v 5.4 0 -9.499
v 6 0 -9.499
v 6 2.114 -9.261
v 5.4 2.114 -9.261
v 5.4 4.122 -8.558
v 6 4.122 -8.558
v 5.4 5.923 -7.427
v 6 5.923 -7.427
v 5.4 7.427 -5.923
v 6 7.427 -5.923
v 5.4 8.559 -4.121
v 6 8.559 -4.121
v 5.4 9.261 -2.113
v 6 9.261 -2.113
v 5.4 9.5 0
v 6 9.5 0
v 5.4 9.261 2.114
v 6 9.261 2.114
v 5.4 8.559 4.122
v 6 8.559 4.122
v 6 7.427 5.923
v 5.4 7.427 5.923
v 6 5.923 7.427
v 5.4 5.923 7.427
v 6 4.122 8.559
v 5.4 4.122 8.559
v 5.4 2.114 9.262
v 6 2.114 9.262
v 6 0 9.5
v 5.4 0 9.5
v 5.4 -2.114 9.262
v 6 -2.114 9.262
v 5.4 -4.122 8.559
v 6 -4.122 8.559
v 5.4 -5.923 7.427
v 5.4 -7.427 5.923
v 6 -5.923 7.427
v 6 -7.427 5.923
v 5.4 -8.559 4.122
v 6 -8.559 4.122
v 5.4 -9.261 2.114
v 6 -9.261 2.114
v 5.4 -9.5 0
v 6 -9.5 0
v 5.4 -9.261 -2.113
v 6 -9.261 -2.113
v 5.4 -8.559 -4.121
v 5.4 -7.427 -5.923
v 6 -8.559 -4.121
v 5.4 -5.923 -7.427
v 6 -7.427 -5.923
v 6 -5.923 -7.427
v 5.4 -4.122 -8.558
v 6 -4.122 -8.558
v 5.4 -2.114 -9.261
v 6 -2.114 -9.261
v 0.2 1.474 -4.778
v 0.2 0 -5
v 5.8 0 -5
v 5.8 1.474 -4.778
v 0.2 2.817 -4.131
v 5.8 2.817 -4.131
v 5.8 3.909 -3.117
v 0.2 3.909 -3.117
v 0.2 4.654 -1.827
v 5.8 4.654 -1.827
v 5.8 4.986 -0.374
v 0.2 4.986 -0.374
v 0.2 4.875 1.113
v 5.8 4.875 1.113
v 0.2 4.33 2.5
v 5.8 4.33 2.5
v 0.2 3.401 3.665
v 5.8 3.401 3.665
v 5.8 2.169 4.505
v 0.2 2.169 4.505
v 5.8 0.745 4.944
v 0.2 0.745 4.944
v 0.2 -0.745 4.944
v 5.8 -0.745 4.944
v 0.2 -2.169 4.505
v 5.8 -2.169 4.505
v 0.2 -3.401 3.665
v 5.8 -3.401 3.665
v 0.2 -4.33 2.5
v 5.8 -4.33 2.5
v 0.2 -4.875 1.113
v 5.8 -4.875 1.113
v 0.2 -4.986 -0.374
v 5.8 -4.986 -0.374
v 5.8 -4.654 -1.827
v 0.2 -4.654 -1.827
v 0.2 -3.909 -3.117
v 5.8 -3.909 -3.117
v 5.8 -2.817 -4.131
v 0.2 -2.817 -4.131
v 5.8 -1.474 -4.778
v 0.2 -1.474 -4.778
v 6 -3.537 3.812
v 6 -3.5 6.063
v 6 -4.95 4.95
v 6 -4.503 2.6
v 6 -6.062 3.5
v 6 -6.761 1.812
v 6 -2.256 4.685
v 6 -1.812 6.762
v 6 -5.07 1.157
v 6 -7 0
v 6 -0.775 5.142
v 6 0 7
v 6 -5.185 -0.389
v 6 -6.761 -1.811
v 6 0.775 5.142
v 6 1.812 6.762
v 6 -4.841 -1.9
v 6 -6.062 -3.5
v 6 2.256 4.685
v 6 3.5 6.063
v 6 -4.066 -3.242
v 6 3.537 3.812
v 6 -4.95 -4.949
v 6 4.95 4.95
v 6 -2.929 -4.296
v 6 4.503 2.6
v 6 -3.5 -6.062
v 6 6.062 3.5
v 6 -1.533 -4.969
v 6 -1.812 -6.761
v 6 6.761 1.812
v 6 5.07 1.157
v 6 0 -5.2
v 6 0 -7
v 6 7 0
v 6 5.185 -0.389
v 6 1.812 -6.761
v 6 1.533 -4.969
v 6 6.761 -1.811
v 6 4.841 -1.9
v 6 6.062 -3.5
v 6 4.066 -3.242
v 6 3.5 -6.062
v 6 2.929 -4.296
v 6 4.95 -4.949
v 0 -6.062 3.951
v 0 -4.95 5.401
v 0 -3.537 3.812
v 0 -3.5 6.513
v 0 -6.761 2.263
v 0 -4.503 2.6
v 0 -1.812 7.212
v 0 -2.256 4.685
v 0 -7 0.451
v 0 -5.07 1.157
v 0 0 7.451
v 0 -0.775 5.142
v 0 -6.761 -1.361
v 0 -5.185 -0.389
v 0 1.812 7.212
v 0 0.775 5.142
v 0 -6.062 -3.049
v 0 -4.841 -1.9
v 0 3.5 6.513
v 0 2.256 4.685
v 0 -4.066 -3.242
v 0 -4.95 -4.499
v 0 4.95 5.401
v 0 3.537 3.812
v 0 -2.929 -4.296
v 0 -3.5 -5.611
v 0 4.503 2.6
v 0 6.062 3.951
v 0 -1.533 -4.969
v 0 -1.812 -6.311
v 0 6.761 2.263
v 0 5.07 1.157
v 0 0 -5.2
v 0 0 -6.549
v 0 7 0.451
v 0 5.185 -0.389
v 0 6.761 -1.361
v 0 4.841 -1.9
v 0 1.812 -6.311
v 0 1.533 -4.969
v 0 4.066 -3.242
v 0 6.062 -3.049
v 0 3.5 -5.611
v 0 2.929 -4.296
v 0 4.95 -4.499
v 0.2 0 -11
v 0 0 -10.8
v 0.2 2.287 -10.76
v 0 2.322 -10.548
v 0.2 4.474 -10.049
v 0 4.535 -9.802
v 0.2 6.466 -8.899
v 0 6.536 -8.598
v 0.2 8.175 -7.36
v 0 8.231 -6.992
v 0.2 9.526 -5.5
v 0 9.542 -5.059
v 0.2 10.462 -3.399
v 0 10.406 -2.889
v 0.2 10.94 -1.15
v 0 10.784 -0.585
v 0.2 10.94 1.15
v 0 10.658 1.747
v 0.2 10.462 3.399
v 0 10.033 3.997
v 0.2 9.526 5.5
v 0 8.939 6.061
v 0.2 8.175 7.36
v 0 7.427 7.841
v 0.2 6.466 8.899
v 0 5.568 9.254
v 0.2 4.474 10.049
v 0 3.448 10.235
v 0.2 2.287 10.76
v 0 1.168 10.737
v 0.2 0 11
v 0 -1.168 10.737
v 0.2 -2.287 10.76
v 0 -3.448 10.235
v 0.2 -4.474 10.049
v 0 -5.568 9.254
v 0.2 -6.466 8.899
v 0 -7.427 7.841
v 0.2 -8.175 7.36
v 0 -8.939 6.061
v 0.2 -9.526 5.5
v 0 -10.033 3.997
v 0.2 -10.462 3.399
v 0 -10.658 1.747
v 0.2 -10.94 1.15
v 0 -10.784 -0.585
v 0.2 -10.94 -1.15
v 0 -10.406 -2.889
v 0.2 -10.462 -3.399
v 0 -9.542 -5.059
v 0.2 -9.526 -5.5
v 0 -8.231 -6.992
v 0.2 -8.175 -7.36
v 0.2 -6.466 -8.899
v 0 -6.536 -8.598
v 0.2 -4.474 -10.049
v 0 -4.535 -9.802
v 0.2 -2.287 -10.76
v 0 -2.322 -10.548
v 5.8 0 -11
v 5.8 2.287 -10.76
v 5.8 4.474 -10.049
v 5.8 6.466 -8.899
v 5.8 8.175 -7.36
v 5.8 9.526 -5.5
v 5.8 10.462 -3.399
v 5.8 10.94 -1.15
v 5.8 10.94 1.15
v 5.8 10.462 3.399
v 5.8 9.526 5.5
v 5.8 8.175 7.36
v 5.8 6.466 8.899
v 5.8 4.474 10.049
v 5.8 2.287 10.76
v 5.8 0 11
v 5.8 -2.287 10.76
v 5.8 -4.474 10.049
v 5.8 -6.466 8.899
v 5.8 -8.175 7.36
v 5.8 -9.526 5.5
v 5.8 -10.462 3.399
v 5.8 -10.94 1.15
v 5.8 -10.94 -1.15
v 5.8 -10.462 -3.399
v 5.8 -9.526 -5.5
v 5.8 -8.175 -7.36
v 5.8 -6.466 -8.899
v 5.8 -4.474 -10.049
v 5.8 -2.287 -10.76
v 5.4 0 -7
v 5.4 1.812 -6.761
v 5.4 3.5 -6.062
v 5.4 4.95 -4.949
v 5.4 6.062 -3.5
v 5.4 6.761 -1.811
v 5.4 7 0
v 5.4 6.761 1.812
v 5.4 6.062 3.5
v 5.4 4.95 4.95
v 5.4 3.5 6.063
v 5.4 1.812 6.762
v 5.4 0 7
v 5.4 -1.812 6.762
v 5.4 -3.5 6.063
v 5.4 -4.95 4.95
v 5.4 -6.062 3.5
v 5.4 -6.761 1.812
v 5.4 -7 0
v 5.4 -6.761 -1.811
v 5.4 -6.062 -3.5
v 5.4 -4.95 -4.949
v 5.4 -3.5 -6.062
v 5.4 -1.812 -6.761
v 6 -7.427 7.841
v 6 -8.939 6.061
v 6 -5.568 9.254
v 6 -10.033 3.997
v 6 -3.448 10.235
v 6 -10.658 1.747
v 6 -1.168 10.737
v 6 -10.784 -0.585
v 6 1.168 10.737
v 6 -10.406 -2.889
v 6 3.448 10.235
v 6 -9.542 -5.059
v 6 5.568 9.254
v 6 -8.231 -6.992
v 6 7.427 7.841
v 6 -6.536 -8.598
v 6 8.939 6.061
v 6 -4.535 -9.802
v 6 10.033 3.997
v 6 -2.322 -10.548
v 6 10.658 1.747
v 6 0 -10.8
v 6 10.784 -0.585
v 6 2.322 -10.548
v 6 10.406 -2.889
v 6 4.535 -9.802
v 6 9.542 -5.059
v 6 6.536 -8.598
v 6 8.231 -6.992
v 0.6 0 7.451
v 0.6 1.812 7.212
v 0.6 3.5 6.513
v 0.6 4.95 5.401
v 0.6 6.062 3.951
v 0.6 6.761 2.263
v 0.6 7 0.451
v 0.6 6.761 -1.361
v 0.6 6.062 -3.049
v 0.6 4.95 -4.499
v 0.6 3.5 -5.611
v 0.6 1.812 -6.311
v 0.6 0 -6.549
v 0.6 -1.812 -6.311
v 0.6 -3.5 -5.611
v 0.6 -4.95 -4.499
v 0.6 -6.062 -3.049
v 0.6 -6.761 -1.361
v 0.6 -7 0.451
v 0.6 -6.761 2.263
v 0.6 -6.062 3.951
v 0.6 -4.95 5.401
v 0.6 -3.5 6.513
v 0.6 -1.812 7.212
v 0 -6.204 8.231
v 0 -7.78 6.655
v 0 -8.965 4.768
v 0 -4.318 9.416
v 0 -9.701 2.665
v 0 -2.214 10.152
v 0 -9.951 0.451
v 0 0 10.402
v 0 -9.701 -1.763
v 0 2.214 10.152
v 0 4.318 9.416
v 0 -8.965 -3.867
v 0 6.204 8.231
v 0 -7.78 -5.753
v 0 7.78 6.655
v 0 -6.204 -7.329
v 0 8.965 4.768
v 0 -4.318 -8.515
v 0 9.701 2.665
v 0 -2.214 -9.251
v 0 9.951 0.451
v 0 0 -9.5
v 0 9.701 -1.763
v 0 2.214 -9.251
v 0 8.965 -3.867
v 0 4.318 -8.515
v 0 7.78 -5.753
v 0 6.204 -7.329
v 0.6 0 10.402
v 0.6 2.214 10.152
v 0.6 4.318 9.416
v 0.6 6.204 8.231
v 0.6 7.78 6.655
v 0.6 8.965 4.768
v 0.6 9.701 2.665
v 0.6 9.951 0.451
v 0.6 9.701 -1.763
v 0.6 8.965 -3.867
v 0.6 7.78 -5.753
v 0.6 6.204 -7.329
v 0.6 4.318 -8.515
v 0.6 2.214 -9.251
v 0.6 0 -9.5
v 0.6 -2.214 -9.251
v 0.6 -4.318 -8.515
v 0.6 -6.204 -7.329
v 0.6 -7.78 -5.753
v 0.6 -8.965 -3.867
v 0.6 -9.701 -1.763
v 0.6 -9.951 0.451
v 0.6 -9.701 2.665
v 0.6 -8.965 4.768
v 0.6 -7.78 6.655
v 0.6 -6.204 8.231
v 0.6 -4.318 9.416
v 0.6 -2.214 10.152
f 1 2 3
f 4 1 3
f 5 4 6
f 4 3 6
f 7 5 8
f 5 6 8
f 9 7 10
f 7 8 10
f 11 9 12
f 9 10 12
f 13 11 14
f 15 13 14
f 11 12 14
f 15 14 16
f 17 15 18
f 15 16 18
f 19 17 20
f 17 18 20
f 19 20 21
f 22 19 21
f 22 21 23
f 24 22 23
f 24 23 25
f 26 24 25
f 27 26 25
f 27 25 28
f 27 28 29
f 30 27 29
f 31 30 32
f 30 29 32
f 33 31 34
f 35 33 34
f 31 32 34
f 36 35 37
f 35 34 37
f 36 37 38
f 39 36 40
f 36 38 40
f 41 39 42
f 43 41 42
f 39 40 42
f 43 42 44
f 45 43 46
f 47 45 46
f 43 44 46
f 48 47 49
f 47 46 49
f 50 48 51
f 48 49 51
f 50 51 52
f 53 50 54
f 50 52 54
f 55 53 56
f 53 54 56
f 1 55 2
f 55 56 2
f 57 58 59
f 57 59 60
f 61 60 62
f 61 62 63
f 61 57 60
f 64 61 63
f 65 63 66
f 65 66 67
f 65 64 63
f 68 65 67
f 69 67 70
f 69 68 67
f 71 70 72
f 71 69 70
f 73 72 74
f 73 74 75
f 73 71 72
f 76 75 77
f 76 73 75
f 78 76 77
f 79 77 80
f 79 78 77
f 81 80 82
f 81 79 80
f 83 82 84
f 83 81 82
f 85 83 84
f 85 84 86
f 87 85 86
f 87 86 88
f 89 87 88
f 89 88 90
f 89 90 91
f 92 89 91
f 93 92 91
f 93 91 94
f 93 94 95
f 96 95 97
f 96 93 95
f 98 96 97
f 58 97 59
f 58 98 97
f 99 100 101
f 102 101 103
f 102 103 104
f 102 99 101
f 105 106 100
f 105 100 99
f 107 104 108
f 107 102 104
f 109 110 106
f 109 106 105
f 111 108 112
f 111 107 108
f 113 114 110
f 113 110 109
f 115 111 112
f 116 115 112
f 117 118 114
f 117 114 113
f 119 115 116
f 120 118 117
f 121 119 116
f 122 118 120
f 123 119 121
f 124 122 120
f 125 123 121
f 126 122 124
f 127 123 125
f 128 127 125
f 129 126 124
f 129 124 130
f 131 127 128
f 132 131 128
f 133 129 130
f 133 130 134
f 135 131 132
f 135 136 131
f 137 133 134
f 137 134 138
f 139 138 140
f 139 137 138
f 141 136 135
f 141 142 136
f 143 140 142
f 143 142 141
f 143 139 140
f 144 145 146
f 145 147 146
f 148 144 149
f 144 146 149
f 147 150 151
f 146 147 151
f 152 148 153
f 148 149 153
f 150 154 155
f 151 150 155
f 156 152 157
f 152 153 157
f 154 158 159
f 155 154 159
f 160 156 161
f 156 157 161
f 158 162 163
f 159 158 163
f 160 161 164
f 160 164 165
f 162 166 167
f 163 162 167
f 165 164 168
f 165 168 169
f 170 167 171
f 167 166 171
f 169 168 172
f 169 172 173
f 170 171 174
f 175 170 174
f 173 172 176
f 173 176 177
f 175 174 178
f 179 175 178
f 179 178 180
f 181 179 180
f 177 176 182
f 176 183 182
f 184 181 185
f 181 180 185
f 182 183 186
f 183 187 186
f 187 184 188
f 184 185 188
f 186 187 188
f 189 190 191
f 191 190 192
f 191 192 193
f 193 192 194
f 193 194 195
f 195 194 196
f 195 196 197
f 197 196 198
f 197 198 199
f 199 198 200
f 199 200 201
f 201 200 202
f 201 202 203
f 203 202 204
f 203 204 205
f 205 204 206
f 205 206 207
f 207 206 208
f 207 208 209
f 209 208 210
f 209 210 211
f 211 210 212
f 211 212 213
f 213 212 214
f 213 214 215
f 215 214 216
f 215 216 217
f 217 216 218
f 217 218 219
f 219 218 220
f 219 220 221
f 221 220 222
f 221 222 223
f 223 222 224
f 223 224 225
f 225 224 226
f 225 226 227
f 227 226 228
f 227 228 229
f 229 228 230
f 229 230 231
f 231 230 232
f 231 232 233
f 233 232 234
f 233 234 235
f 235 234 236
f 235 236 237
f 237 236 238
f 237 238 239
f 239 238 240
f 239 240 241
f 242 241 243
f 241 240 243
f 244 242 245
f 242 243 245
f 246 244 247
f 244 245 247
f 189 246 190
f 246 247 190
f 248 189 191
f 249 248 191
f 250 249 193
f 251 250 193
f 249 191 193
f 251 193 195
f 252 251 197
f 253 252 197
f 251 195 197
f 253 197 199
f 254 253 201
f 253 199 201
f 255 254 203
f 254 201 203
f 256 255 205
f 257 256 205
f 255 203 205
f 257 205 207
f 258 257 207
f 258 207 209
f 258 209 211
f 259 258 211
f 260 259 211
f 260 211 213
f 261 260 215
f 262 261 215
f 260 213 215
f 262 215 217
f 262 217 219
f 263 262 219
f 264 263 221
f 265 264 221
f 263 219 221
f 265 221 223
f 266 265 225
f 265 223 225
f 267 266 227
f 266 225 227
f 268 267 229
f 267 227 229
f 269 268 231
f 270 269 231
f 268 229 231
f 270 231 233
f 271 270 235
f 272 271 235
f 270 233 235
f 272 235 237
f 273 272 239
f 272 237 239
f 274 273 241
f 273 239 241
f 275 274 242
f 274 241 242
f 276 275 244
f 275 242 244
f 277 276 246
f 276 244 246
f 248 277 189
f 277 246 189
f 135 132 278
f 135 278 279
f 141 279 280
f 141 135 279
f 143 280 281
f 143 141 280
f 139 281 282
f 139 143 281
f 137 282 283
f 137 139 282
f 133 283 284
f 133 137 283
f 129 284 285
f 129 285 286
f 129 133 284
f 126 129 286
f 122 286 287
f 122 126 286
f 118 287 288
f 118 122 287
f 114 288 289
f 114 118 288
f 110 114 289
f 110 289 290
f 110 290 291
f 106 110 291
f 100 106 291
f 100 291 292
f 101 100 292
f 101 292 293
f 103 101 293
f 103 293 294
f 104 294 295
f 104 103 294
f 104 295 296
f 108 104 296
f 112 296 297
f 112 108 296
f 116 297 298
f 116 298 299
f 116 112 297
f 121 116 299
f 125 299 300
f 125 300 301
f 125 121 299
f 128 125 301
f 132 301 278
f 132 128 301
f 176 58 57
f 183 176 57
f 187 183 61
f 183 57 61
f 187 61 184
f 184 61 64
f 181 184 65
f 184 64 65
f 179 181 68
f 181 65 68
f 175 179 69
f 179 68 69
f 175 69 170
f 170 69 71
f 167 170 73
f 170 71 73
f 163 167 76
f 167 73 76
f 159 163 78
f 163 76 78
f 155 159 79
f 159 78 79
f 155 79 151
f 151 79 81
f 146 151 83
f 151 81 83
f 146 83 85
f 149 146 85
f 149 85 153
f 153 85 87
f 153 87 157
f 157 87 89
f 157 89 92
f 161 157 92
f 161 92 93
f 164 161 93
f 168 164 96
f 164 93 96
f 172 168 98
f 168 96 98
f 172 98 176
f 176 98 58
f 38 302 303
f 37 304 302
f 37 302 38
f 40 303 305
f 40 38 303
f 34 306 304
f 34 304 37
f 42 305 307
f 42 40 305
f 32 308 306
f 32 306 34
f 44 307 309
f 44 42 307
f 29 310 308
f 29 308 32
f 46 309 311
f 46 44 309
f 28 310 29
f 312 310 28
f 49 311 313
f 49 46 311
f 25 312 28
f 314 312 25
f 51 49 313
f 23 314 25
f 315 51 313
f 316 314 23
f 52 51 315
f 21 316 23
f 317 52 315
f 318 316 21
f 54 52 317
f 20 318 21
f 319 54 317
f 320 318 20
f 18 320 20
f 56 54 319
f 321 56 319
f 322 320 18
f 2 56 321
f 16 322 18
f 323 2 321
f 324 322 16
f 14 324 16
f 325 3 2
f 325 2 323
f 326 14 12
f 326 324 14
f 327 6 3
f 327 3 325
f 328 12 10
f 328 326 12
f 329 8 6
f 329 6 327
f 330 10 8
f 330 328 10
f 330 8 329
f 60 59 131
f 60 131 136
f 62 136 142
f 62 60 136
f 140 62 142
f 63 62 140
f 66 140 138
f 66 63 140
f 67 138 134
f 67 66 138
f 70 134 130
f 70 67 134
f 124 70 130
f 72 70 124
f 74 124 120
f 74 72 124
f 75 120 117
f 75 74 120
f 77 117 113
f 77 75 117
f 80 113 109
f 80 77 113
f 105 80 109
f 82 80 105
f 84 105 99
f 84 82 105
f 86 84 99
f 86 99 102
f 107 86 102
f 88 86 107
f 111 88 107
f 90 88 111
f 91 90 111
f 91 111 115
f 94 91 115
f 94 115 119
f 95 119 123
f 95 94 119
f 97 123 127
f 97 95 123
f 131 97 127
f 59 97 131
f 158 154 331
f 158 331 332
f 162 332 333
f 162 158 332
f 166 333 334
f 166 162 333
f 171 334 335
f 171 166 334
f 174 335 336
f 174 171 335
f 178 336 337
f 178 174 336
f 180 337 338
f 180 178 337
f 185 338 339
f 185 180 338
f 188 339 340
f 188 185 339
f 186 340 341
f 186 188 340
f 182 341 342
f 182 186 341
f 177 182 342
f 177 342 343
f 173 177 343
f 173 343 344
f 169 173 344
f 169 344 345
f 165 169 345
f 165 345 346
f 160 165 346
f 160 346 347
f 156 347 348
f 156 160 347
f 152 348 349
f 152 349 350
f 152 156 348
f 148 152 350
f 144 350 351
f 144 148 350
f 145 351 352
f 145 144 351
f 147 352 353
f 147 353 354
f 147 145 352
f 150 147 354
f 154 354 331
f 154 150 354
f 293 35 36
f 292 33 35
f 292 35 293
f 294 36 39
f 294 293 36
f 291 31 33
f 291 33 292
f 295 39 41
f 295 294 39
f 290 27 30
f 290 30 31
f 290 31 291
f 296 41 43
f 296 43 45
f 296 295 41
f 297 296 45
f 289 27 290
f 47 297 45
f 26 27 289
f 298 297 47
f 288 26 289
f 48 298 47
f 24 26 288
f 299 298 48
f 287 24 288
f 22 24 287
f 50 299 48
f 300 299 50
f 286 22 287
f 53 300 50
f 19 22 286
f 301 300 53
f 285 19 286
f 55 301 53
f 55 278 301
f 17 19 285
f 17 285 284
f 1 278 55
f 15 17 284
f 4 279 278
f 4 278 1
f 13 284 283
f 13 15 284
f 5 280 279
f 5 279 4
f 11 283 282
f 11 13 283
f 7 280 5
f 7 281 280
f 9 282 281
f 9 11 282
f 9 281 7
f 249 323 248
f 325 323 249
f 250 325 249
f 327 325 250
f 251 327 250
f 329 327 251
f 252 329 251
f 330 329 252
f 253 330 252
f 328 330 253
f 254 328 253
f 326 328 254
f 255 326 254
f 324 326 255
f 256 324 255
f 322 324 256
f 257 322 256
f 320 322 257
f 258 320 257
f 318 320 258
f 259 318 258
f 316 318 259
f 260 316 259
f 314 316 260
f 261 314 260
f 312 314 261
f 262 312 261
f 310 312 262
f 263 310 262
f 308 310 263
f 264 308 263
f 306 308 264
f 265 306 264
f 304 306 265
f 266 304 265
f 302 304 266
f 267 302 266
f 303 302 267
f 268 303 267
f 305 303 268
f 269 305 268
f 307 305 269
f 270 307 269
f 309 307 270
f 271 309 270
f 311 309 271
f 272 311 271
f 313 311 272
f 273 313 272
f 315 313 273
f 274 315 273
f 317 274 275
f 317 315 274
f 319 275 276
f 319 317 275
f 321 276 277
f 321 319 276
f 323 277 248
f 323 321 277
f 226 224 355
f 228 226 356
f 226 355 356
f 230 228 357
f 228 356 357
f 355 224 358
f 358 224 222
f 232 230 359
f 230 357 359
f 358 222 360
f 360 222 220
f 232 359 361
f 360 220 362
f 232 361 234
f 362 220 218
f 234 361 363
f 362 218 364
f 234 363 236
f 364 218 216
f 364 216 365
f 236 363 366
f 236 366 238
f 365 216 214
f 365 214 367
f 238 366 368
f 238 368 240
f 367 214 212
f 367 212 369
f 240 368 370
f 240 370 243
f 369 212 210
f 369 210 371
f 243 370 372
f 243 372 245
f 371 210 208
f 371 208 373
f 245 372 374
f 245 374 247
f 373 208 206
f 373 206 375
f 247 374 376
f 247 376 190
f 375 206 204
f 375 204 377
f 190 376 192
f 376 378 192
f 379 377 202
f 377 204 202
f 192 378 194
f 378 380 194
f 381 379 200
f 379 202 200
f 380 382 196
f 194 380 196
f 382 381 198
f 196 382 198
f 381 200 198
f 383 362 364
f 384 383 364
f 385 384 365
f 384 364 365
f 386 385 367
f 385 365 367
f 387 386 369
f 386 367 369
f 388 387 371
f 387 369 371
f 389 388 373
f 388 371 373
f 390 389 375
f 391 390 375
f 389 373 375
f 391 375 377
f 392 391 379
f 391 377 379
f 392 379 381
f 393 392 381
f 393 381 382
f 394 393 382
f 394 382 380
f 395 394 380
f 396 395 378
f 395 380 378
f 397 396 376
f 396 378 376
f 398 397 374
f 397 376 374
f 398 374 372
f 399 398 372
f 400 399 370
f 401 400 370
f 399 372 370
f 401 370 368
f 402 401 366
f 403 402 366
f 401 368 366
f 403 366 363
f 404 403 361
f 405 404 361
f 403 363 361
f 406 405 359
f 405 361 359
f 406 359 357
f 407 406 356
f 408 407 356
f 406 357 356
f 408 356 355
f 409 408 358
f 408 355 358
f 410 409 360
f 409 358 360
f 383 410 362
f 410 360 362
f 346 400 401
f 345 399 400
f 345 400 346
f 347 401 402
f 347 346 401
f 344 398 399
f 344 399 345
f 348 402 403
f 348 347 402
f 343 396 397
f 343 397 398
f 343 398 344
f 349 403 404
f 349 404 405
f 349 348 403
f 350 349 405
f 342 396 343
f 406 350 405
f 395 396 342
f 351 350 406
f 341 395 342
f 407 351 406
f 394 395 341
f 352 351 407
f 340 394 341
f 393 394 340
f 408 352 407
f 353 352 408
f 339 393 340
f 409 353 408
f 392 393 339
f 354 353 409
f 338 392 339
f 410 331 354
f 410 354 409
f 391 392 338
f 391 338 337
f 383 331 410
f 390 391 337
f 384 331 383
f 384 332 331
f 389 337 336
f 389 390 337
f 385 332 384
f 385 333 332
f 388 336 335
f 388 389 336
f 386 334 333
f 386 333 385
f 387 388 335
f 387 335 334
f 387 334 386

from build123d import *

# Parameters (mm, degrees)
SKETCH_1_R          = 11
SKETCH_1_R_2        = 5
EXTRUDE_1_DEPTH     = 6
SKETCH_2_R          = 9.499624375
SKETCH_2_R_2        = 7
CUT_EXTRUDE_1_DEPTH = 0.6
SKETCH_3_R          = 9.950876812
SKETCH_3_R_2        = 7
CUT_EXTRUDE_2_DEPTH = 0.6
CHAMFER_1_SIZE      = 0.2


with BuildPart() as part:
    # 草图1 → 凸台-拉伸1 (new body)
    with BuildSketch(Plane(origin=(0, 0, 0), x_dir=(0, 0, -1), z_dir=(1, 0, 0))):
        Circle(SKETCH_1_R)
        Circle(SKETCH_1_R_2, mode=Mode.SUBTRACT)
    extrude(amount=EXTRUDE_1_DEPTH)

    # 草图2 → 切除-拉伸1 (cut)
    with BuildSketch(Plane(origin=(6, 0, 0), x_dir=(0, 0, -1), z_dir=(1, 0, 0))):
        with Locations((-0.000375625, 0)):
            Circle(SKETCH_2_R)
        with Locations((-0.000375625, 0)):
            Circle(SKETCH_2_R_2, mode=Mode.SUBTRACT)
    extrude(amount=-CUT_EXTRUDE_1_DEPTH, mode=Mode.SUBTRACT)

    # 草图3 → 切除-拉伸2 (cut)
    with BuildSketch(Plane.ZY):
        with Locations((0.450876812, 0)):
            Circle(SKETCH_3_R)
        with Locations((0.450876812, 0)):
            Circle(SKETCH_3_R_2, mode=Mode.SUBTRACT)
    extrude(amount=-CUT_EXTRUDE_2_DEPTH, mode=Mode.SUBTRACT)

    # 倒角1
    chamfer_1_edges = [part.edges().sort_by_distance(p)[0] for p in [
        (0, 0, 11),
        (6, 0, 11),
        (0, 0, 5),
        (6, 0, 5),
    ]]
    chamfer(chamfer_1_edges, length=CHAMFER_1_SIZE)


solid = part.part
